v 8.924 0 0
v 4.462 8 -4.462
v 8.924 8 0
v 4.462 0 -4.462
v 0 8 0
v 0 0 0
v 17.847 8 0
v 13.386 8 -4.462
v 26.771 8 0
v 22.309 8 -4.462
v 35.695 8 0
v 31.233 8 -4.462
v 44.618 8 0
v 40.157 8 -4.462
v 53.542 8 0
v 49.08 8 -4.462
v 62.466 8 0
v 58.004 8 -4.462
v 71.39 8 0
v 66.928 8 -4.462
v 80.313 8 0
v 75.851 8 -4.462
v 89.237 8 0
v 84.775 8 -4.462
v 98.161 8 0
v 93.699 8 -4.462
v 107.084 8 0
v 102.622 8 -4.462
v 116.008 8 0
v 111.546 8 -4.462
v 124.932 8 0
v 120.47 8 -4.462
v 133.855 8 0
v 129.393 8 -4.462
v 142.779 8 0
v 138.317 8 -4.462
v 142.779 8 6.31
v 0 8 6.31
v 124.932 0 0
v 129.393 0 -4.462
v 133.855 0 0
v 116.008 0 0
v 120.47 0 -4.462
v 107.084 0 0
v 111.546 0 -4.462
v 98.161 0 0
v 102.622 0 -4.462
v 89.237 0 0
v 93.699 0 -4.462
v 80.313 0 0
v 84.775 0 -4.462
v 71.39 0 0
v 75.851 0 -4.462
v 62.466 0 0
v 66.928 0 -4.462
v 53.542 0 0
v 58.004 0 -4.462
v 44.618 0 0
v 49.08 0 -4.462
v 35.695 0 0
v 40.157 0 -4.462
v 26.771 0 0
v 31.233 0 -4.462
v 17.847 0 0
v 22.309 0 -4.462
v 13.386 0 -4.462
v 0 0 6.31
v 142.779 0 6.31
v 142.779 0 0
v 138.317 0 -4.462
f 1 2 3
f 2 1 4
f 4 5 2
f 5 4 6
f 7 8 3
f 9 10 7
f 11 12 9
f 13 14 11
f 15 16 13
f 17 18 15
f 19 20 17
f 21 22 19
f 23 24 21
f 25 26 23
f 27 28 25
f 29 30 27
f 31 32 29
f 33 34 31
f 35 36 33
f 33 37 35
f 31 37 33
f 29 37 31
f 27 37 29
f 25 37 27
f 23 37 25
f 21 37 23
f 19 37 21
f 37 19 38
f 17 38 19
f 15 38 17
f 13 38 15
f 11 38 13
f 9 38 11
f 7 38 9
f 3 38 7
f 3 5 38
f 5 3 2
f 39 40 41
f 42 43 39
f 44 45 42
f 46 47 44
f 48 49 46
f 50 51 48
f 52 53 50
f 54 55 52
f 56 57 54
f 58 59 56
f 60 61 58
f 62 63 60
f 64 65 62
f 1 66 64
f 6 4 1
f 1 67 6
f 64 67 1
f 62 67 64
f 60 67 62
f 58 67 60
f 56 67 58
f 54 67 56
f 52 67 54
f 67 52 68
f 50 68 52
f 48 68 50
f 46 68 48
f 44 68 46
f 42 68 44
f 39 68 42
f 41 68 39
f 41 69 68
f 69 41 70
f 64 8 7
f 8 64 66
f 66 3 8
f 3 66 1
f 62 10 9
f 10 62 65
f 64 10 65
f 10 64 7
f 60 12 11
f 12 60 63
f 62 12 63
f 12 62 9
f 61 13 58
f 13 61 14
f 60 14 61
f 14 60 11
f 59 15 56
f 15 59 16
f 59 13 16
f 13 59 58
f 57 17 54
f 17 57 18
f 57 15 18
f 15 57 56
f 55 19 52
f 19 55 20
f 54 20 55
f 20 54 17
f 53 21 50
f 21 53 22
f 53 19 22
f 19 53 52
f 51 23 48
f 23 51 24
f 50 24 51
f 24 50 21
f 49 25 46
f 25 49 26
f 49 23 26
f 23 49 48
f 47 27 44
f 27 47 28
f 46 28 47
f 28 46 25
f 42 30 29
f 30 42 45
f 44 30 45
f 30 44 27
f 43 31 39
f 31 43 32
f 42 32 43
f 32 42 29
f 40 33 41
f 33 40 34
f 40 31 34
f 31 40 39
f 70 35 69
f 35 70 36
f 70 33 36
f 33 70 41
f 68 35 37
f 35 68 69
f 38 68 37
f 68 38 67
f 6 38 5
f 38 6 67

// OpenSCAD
width = 30;
height = 6.31;
depth = 8;
n = 4;

module teeth() {
	for (i = [0:15]) {
		translate([i*sqrt(2)*height, 0, 0]){
			rotate(45,[0,45,0]){
				cube([height,depth,height]);
		}		
		}
	}
}
echo(15*sqrt(2)*height);
union() {
teeth();
cube([16*sqrt(2)*height, depth, height]);
}
